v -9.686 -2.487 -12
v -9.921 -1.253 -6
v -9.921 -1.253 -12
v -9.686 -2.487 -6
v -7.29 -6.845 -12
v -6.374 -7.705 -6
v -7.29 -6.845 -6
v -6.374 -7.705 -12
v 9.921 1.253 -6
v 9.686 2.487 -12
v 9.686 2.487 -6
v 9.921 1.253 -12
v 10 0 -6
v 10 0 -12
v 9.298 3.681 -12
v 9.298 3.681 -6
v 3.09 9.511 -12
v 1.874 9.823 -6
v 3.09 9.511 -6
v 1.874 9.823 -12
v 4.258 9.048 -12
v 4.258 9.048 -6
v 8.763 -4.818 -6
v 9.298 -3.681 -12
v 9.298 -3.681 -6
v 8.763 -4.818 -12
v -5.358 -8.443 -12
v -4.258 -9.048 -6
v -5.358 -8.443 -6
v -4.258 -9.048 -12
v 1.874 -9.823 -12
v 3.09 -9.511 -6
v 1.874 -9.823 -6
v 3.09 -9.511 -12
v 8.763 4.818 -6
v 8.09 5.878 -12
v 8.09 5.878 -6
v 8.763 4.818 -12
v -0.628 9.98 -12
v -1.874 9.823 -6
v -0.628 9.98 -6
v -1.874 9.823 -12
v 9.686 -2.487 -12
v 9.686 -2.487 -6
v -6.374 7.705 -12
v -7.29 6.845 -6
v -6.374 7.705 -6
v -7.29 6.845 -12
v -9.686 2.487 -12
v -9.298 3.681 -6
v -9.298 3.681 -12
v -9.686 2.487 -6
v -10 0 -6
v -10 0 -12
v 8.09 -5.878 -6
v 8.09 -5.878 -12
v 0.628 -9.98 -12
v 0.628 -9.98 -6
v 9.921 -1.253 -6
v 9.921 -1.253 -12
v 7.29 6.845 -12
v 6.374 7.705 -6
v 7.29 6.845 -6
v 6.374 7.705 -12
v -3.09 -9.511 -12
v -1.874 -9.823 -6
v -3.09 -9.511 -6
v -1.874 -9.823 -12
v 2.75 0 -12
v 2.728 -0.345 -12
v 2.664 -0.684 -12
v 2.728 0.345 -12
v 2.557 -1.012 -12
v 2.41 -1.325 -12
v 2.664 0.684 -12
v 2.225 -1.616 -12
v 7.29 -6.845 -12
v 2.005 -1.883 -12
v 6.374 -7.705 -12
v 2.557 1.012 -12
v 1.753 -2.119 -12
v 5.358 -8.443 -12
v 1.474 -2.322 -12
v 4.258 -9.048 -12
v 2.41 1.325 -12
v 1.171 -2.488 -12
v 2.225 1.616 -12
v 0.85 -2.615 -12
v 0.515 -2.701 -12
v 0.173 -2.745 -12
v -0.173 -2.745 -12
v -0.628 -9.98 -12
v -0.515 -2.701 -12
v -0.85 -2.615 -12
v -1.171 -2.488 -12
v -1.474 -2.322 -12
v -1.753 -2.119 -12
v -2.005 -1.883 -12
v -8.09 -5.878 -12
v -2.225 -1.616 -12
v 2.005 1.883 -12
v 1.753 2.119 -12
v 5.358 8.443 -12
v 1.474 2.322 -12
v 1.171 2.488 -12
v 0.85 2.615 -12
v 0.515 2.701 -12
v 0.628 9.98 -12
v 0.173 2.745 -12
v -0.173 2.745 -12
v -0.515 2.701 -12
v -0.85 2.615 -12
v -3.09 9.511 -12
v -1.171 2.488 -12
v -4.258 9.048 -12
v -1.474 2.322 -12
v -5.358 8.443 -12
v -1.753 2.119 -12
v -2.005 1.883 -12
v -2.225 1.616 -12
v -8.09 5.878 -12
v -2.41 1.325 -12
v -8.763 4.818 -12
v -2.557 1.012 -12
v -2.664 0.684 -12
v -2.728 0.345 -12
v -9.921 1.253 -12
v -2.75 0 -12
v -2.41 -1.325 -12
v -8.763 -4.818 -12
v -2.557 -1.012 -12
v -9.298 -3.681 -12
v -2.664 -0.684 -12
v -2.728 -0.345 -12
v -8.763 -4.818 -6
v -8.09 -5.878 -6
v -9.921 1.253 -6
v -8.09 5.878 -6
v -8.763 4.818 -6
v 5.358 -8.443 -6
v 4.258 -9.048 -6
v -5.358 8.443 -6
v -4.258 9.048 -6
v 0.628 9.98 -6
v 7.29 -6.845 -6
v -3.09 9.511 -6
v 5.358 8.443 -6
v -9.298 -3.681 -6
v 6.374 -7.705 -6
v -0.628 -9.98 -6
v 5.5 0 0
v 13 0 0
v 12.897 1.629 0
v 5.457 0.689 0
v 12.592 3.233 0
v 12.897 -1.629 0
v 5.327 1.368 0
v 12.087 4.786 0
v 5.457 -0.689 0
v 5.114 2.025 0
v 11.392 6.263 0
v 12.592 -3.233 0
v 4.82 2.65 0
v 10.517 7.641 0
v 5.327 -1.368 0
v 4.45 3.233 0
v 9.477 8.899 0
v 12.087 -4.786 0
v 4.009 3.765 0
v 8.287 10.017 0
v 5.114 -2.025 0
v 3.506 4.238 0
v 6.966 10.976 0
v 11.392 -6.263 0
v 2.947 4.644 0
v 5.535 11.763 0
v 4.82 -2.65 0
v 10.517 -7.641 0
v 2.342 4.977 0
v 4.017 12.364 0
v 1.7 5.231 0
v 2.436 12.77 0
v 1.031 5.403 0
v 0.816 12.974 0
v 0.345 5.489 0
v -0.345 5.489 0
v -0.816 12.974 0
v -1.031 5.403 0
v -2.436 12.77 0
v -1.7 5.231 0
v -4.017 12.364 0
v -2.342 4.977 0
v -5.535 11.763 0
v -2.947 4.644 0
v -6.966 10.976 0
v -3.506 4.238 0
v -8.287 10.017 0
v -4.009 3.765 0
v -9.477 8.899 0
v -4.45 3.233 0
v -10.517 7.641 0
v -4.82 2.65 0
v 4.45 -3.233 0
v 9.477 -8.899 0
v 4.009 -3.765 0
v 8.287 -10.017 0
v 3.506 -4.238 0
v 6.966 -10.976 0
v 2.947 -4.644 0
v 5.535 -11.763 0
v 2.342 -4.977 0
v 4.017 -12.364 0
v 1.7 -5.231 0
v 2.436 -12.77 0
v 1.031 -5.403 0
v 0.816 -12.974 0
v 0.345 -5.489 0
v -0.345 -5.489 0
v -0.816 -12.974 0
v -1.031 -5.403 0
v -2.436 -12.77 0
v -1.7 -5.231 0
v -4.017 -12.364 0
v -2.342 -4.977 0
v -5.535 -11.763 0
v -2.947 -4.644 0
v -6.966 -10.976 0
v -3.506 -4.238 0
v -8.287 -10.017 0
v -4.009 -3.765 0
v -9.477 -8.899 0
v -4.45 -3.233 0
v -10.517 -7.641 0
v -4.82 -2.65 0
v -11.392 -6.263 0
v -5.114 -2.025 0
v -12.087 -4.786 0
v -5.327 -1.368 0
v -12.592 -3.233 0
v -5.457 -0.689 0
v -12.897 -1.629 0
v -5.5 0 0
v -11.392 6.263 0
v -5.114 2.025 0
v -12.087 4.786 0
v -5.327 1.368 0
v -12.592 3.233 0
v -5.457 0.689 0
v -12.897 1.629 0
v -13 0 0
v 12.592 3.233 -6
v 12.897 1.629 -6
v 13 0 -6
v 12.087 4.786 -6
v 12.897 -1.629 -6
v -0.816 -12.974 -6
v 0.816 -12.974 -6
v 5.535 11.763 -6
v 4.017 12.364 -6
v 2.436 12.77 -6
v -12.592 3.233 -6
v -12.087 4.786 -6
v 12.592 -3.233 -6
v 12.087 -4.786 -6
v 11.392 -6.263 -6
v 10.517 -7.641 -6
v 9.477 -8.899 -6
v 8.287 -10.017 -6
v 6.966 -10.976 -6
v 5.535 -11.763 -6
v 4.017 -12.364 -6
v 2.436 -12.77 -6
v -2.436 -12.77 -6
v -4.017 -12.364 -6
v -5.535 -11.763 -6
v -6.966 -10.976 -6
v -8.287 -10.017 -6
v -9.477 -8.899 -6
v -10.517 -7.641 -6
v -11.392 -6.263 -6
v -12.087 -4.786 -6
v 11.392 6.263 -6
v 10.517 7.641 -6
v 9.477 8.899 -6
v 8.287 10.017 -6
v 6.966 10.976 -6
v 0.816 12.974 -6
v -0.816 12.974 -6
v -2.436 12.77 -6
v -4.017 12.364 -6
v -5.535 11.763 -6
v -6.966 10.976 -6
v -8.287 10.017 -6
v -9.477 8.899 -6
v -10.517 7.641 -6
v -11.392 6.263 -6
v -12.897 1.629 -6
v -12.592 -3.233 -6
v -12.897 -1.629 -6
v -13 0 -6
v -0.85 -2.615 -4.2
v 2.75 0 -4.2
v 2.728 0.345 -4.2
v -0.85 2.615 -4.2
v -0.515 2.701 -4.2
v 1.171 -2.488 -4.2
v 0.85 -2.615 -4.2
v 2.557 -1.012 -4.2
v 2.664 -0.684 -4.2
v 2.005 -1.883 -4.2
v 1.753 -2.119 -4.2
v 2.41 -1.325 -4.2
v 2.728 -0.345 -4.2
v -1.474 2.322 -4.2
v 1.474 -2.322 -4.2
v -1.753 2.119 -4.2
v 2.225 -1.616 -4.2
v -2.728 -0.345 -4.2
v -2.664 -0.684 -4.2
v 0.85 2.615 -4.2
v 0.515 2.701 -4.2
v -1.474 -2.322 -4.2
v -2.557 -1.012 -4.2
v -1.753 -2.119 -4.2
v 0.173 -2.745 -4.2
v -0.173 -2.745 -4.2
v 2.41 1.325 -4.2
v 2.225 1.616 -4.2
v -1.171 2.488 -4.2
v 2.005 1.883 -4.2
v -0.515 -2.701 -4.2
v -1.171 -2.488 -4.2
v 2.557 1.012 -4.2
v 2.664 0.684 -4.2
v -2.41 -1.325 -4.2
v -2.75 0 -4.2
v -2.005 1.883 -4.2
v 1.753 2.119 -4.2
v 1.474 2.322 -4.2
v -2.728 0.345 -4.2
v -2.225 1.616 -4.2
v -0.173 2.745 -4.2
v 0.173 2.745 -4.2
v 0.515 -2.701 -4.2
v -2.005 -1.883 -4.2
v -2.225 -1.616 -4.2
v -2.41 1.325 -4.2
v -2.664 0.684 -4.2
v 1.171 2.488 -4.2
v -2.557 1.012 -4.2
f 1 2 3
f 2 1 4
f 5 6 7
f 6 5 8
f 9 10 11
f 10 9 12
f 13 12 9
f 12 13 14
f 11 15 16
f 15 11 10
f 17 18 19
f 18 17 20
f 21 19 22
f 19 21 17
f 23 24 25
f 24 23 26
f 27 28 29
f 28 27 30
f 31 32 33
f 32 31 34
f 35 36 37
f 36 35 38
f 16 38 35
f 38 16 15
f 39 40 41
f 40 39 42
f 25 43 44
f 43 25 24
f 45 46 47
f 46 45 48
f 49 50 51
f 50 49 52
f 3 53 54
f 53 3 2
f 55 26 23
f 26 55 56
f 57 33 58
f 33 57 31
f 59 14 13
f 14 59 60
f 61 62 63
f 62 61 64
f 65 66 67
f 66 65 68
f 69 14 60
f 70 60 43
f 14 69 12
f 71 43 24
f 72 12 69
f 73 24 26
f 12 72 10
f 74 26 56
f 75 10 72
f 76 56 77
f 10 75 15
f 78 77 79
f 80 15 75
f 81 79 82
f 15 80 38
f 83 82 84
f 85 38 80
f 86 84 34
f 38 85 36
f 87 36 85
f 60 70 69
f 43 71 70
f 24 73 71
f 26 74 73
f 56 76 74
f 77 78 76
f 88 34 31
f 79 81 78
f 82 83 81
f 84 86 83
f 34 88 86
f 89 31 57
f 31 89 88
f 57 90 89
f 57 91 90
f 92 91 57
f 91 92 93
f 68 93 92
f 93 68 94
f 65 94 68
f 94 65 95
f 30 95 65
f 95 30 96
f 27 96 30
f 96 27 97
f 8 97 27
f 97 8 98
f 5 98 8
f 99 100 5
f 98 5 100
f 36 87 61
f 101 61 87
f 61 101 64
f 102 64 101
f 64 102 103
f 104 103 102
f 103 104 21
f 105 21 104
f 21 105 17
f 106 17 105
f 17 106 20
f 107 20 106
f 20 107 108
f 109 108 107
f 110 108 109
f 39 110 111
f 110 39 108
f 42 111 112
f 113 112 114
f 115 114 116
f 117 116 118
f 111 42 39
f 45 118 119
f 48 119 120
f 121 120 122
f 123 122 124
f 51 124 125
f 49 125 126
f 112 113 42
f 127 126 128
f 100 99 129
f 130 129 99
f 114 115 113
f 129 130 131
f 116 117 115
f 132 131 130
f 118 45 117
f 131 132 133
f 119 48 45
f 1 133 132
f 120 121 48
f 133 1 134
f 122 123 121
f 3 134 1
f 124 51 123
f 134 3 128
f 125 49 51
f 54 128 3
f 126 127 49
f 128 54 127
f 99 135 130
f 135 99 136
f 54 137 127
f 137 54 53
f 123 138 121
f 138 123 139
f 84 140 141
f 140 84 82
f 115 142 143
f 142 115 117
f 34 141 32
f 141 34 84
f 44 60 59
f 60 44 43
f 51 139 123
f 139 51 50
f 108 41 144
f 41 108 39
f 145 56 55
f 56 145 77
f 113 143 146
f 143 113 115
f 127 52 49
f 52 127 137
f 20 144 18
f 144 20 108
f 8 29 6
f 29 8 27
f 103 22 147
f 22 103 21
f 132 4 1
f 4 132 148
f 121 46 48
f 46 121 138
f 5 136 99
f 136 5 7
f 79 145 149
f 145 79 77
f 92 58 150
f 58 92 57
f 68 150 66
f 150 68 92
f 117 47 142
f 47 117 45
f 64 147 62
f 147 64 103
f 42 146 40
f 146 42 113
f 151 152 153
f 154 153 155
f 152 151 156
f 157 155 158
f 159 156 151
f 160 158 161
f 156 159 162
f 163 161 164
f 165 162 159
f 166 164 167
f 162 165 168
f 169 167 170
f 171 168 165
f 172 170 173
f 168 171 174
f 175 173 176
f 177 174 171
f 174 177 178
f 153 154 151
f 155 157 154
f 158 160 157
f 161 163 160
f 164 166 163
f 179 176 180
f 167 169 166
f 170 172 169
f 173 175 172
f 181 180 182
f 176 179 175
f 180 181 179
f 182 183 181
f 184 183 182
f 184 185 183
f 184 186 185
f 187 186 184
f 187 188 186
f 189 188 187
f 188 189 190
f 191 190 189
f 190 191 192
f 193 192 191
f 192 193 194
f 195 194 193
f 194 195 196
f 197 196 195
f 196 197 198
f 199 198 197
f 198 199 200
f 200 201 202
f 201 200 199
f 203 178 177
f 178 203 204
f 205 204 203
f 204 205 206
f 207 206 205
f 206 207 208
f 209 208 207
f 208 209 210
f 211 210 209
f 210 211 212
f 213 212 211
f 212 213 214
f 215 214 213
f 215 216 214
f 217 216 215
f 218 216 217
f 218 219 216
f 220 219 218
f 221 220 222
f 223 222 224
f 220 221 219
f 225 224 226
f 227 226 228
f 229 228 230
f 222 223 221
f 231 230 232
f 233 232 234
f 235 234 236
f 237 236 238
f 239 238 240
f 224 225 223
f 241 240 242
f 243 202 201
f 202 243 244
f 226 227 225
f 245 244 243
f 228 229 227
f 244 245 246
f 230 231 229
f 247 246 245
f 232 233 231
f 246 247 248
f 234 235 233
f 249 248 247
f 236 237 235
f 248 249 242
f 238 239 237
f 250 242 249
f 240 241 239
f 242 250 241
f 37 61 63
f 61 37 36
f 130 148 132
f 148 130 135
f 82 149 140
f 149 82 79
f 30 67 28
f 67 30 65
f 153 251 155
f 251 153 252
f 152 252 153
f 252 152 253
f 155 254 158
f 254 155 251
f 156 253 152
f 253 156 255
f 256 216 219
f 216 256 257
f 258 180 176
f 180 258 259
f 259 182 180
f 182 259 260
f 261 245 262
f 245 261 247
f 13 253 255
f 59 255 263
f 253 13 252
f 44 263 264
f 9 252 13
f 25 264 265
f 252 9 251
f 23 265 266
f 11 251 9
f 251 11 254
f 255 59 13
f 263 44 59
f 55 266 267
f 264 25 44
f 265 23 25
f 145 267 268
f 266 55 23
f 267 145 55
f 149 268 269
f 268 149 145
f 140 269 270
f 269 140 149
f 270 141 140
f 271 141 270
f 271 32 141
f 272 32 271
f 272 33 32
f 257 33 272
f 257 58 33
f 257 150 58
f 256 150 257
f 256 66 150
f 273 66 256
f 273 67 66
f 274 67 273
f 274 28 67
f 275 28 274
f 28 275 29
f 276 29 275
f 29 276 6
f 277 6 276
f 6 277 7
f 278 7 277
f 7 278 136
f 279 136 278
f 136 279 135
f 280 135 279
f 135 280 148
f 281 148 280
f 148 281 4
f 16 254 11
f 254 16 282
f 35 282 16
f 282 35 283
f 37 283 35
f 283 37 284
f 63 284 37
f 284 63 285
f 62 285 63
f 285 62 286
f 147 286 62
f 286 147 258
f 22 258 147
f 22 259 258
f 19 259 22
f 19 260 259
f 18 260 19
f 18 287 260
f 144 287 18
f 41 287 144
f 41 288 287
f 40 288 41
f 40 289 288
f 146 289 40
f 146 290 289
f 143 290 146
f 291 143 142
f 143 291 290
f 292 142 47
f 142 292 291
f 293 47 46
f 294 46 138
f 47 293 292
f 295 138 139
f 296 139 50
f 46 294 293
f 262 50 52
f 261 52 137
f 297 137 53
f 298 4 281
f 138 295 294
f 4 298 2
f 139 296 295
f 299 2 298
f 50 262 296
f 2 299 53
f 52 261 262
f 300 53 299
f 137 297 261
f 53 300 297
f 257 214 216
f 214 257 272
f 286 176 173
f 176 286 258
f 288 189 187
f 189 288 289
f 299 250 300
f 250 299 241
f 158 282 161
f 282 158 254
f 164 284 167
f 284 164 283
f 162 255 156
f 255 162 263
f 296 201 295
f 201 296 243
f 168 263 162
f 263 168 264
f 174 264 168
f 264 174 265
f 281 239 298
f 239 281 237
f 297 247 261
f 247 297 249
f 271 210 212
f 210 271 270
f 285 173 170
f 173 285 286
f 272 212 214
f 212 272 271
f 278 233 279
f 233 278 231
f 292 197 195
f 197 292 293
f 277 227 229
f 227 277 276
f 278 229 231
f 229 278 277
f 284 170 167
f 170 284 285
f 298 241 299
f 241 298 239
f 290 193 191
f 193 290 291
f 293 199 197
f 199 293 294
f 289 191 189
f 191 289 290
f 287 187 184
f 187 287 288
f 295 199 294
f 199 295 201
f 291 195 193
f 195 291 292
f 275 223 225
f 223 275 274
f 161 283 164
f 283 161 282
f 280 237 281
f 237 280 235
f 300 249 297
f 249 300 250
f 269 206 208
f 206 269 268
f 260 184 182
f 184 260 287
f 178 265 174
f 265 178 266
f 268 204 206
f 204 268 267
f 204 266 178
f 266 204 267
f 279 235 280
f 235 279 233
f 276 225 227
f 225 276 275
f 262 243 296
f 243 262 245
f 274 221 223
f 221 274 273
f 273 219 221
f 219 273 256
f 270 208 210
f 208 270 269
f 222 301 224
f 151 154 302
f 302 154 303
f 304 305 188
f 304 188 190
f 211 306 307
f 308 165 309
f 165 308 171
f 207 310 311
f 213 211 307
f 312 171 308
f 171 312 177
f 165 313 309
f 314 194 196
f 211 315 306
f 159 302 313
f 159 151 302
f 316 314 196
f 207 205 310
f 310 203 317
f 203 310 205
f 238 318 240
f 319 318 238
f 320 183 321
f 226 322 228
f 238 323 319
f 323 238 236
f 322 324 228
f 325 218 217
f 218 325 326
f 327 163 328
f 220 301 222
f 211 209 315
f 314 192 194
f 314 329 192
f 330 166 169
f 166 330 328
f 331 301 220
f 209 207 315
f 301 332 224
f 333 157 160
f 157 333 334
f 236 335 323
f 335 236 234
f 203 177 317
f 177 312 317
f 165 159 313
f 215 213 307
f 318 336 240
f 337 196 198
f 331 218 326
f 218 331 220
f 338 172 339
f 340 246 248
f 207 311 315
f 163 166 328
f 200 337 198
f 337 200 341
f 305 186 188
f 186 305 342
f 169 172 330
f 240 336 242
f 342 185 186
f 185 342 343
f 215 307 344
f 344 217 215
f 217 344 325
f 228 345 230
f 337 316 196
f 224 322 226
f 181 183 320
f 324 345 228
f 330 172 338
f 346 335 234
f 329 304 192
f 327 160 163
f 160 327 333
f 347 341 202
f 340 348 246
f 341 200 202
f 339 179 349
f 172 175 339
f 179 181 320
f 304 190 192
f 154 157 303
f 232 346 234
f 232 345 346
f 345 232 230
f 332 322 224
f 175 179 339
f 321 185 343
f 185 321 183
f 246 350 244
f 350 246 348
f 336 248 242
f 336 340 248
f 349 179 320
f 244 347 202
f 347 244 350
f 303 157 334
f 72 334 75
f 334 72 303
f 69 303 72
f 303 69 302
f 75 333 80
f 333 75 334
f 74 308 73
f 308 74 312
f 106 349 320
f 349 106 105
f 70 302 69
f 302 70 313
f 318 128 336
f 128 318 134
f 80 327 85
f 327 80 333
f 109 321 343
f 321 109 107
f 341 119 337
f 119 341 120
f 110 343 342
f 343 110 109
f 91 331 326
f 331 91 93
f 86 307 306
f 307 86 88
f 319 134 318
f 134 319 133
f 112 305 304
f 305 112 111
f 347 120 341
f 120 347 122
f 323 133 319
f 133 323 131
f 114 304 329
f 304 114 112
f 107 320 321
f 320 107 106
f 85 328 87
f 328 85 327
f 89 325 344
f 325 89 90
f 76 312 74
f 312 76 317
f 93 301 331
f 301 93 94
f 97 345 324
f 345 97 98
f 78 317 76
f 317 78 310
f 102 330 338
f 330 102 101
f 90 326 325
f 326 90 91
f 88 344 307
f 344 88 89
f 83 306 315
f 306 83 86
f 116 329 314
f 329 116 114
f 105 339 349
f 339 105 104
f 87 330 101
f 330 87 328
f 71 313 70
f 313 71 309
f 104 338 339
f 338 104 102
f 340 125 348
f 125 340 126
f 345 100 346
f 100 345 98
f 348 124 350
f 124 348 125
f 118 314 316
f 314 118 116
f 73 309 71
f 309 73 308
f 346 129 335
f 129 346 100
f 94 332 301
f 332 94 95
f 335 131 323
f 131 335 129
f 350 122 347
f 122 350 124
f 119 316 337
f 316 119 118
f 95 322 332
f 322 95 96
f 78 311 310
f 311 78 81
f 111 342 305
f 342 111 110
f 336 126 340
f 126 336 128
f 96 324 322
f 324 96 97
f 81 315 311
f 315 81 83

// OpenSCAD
$fn = 50;


difference() {
	union() {
		translate(v = [0, 0, -12.0000000000]) {
			cylinder(h = 12, r = 10.0000000000);
		}
		translate(v = [0, 0, -6.0000000000]) {
			cylinder(h = 6, r = 13.0000000000);
		}
	}
	union() {
		translate(v = [0, 0, 0]) {
			rotate(a = [0, 0, 0]) {
				difference() {
					union() {
						#translate(v = [0, 0, -12.0000000000]) {
							cylinder(h = 12, r = 2.2500000000);
						}
						#translate(v = [0, 0, -4.2000000000]) {
							cylinder(h = 4.2000000000, r = 10.0000000000, r1 = 2.7500000000, r2 = 5.5000000000);
						}
						#translate(v = [0, 0, -12.0000000000]) {
							cylinder(h = 12, r = 2.7500000000);
						}
						#translate(v = [0, 0, -12.0000000000]) {
							cylinder(h = 12, r = 2.2500000000);
						}
					}
					union();
				}
			}
		}
	}
}
